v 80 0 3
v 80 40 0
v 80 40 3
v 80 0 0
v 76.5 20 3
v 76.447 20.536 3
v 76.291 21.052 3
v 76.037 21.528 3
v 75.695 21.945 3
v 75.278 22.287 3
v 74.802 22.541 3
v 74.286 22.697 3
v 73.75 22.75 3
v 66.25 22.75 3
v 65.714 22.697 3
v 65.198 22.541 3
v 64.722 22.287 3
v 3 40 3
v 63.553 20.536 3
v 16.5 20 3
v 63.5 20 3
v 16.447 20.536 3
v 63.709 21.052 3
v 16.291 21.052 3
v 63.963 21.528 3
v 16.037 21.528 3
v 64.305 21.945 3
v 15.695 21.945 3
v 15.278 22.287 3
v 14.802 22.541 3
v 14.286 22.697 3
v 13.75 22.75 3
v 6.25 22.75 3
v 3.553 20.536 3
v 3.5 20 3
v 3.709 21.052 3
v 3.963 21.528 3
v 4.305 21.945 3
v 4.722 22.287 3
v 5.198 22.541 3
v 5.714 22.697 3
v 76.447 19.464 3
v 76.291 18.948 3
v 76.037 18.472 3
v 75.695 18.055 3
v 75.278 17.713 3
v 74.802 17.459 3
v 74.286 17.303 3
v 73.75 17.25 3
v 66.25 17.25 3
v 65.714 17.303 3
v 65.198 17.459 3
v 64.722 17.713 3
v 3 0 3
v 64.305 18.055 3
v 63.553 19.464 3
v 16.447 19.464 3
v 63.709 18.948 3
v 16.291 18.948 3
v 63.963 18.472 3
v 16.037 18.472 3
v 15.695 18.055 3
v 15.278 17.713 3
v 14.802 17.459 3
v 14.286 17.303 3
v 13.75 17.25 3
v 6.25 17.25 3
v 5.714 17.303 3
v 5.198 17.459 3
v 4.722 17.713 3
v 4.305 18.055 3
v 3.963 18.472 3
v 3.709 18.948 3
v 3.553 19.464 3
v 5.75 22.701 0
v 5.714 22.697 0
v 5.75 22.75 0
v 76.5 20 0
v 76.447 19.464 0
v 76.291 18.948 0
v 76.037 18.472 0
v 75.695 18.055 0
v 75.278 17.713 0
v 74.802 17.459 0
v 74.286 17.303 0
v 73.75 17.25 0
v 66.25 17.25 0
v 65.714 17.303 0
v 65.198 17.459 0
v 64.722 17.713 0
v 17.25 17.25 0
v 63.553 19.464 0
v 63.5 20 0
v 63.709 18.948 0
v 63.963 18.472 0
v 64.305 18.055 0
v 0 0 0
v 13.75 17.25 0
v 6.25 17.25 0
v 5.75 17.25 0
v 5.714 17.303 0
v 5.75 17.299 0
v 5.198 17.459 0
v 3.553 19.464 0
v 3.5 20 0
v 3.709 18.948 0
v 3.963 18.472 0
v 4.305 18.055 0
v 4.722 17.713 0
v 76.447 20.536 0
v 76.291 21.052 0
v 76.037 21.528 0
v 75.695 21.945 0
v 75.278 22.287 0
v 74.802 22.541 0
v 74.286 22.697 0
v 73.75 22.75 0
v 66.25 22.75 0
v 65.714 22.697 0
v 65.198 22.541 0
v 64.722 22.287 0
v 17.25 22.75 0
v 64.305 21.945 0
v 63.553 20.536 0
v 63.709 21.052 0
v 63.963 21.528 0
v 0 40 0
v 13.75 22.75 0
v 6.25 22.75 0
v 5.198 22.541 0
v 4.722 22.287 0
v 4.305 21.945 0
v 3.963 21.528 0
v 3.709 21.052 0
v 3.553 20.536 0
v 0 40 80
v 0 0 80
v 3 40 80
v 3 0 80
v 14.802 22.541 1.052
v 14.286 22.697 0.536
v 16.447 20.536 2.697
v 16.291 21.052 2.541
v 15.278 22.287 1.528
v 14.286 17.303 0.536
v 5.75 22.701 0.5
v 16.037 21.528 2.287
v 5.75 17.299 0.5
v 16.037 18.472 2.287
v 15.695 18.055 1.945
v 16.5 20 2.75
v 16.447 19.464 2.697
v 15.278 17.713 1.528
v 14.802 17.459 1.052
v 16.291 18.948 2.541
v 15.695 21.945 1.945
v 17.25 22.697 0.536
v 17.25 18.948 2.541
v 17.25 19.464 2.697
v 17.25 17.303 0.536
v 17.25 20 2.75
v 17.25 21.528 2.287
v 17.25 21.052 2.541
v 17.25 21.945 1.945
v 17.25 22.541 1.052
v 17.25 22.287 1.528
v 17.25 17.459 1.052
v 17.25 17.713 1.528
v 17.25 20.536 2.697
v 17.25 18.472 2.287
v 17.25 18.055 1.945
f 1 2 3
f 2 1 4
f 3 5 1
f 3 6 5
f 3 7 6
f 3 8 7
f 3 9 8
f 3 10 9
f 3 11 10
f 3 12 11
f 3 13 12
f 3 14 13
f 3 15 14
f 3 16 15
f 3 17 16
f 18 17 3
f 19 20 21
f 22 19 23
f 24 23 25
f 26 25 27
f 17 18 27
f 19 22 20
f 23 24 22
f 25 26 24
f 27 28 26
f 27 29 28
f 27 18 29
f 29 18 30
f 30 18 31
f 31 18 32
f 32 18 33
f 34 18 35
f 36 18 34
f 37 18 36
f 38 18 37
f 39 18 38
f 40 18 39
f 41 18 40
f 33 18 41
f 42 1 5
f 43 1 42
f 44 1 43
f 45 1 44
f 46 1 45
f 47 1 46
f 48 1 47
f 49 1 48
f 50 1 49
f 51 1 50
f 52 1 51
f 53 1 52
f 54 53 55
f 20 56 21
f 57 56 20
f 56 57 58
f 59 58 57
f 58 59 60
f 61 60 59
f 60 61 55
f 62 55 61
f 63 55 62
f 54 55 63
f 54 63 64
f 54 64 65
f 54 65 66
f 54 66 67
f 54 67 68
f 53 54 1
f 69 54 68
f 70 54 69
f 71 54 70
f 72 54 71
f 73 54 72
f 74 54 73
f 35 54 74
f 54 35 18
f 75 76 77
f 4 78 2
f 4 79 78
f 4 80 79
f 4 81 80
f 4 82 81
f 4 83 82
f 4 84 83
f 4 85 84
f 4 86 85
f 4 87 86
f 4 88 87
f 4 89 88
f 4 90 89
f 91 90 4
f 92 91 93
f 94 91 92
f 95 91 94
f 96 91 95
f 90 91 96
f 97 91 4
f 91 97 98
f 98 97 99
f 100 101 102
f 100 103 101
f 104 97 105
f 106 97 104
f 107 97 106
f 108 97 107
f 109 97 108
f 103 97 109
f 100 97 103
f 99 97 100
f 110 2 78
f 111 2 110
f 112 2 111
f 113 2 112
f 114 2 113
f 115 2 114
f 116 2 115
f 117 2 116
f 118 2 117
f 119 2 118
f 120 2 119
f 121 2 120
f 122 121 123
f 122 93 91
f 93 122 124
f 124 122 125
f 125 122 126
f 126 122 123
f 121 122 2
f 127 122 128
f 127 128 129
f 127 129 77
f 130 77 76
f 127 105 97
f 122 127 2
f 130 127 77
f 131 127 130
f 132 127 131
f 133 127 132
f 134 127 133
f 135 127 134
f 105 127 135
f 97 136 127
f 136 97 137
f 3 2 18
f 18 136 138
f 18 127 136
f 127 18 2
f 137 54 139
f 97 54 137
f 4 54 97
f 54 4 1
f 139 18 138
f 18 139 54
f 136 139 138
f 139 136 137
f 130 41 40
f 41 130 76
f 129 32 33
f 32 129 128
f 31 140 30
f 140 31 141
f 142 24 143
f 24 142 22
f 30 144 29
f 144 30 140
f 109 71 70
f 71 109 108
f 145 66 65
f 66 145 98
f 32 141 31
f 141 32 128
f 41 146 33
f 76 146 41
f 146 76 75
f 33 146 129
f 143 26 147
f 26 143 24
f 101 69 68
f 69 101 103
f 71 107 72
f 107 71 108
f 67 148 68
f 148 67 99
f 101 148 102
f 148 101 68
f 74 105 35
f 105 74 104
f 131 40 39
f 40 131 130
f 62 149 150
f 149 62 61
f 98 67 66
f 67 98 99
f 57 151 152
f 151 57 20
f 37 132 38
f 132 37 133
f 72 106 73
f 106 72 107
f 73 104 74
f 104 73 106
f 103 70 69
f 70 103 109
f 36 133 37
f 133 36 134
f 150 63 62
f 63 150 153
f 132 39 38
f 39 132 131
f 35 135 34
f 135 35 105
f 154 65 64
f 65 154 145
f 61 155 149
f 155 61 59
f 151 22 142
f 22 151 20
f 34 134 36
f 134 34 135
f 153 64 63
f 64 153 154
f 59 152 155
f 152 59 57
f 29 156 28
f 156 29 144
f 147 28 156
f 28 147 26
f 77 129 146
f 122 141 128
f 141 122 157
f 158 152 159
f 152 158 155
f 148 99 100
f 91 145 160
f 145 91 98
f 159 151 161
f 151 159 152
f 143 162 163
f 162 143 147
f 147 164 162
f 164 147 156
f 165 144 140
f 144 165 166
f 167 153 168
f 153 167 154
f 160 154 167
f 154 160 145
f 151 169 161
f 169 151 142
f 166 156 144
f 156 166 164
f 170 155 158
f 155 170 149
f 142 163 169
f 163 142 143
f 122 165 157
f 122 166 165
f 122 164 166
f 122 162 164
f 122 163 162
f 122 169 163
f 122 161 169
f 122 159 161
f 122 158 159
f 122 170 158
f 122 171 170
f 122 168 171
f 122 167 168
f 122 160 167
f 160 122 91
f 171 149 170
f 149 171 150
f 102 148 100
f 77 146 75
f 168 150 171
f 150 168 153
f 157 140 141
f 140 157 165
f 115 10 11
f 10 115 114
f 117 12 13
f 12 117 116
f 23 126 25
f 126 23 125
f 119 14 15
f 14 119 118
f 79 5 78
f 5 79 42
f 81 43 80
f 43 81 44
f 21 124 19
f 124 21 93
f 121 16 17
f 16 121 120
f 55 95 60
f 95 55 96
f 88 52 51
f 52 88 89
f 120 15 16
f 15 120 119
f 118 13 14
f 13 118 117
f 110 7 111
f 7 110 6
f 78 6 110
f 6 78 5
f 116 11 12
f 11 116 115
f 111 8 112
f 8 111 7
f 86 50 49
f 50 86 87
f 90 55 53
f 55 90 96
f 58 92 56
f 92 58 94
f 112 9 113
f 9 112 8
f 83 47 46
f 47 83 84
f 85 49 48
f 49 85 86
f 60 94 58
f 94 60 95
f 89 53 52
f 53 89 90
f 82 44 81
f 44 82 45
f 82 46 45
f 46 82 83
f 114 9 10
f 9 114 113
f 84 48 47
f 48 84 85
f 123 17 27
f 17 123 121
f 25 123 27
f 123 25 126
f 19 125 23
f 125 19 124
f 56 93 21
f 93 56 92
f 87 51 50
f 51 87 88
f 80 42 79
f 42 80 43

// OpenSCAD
$fn = 32;

// ----------------------------------------------------------------------
// L-bracket: 80 x 40 x 80 mm
// ----------------------------------------------------------------------

// --- parameters (mm) ---
run_out = 80;             // horizontal leg, X
rise = 80;                // vertical leg, Z
bracket_w = 40;           // bracket depth, Y
sheet_t = 3;              // plate thickness
hole_d = 3.4;             // clearance for M3
slot_w = 5.5;             // euro screw slot width
slot_l = 13;              // euro screw slot length

module hole_z(px, py) {
  translate([px, py, -0.5]) cylinder(h = sheet_t + 1, d = hole_d);
}
module hole_x(pz, py) {
  translate([-0.5, py, pz]) rotate([0, 90, 0]) cylinder(h = sheet_t + 1, d = hole_d);
}
module euro_slot_z(px, py) {
  hull() {
    translate([px - (slot_l - slot_w) / 2, py, -0.5]) cylinder(h = sheet_t + 1, d = slot_w);
    translate([px + (slot_l - slot_w) / 2, py, -0.5]) cylinder(h = sheet_t + 1, d = slot_w);
  }
}
module euro_slot_x(pz, py) {
  translate([-0.5, 0, 0]) rotate([0, 90, 0]) hull() {
    translate([0, py, pz - (slot_l - slot_w) / 2]) cylinder(h = sheet_t + 1, d = slot_w);
    translate([0, py, pz + (slot_l - slot_w) / 2]) cylinder(h = sheet_t + 1, d = slot_w);
  }
}

difference() {
  union() {
    /* horizontal leg */
    cube([run_out, bracket_w, sheet_t]);
    /* vertical leg, overlapping the corner block */
    cube([sheet_t, bracket_w, rise]);
  }
  euro_slot_z(10, 20);
  euro_slot_x(10, 20);
  euro_slot_z(70, 20);
}
